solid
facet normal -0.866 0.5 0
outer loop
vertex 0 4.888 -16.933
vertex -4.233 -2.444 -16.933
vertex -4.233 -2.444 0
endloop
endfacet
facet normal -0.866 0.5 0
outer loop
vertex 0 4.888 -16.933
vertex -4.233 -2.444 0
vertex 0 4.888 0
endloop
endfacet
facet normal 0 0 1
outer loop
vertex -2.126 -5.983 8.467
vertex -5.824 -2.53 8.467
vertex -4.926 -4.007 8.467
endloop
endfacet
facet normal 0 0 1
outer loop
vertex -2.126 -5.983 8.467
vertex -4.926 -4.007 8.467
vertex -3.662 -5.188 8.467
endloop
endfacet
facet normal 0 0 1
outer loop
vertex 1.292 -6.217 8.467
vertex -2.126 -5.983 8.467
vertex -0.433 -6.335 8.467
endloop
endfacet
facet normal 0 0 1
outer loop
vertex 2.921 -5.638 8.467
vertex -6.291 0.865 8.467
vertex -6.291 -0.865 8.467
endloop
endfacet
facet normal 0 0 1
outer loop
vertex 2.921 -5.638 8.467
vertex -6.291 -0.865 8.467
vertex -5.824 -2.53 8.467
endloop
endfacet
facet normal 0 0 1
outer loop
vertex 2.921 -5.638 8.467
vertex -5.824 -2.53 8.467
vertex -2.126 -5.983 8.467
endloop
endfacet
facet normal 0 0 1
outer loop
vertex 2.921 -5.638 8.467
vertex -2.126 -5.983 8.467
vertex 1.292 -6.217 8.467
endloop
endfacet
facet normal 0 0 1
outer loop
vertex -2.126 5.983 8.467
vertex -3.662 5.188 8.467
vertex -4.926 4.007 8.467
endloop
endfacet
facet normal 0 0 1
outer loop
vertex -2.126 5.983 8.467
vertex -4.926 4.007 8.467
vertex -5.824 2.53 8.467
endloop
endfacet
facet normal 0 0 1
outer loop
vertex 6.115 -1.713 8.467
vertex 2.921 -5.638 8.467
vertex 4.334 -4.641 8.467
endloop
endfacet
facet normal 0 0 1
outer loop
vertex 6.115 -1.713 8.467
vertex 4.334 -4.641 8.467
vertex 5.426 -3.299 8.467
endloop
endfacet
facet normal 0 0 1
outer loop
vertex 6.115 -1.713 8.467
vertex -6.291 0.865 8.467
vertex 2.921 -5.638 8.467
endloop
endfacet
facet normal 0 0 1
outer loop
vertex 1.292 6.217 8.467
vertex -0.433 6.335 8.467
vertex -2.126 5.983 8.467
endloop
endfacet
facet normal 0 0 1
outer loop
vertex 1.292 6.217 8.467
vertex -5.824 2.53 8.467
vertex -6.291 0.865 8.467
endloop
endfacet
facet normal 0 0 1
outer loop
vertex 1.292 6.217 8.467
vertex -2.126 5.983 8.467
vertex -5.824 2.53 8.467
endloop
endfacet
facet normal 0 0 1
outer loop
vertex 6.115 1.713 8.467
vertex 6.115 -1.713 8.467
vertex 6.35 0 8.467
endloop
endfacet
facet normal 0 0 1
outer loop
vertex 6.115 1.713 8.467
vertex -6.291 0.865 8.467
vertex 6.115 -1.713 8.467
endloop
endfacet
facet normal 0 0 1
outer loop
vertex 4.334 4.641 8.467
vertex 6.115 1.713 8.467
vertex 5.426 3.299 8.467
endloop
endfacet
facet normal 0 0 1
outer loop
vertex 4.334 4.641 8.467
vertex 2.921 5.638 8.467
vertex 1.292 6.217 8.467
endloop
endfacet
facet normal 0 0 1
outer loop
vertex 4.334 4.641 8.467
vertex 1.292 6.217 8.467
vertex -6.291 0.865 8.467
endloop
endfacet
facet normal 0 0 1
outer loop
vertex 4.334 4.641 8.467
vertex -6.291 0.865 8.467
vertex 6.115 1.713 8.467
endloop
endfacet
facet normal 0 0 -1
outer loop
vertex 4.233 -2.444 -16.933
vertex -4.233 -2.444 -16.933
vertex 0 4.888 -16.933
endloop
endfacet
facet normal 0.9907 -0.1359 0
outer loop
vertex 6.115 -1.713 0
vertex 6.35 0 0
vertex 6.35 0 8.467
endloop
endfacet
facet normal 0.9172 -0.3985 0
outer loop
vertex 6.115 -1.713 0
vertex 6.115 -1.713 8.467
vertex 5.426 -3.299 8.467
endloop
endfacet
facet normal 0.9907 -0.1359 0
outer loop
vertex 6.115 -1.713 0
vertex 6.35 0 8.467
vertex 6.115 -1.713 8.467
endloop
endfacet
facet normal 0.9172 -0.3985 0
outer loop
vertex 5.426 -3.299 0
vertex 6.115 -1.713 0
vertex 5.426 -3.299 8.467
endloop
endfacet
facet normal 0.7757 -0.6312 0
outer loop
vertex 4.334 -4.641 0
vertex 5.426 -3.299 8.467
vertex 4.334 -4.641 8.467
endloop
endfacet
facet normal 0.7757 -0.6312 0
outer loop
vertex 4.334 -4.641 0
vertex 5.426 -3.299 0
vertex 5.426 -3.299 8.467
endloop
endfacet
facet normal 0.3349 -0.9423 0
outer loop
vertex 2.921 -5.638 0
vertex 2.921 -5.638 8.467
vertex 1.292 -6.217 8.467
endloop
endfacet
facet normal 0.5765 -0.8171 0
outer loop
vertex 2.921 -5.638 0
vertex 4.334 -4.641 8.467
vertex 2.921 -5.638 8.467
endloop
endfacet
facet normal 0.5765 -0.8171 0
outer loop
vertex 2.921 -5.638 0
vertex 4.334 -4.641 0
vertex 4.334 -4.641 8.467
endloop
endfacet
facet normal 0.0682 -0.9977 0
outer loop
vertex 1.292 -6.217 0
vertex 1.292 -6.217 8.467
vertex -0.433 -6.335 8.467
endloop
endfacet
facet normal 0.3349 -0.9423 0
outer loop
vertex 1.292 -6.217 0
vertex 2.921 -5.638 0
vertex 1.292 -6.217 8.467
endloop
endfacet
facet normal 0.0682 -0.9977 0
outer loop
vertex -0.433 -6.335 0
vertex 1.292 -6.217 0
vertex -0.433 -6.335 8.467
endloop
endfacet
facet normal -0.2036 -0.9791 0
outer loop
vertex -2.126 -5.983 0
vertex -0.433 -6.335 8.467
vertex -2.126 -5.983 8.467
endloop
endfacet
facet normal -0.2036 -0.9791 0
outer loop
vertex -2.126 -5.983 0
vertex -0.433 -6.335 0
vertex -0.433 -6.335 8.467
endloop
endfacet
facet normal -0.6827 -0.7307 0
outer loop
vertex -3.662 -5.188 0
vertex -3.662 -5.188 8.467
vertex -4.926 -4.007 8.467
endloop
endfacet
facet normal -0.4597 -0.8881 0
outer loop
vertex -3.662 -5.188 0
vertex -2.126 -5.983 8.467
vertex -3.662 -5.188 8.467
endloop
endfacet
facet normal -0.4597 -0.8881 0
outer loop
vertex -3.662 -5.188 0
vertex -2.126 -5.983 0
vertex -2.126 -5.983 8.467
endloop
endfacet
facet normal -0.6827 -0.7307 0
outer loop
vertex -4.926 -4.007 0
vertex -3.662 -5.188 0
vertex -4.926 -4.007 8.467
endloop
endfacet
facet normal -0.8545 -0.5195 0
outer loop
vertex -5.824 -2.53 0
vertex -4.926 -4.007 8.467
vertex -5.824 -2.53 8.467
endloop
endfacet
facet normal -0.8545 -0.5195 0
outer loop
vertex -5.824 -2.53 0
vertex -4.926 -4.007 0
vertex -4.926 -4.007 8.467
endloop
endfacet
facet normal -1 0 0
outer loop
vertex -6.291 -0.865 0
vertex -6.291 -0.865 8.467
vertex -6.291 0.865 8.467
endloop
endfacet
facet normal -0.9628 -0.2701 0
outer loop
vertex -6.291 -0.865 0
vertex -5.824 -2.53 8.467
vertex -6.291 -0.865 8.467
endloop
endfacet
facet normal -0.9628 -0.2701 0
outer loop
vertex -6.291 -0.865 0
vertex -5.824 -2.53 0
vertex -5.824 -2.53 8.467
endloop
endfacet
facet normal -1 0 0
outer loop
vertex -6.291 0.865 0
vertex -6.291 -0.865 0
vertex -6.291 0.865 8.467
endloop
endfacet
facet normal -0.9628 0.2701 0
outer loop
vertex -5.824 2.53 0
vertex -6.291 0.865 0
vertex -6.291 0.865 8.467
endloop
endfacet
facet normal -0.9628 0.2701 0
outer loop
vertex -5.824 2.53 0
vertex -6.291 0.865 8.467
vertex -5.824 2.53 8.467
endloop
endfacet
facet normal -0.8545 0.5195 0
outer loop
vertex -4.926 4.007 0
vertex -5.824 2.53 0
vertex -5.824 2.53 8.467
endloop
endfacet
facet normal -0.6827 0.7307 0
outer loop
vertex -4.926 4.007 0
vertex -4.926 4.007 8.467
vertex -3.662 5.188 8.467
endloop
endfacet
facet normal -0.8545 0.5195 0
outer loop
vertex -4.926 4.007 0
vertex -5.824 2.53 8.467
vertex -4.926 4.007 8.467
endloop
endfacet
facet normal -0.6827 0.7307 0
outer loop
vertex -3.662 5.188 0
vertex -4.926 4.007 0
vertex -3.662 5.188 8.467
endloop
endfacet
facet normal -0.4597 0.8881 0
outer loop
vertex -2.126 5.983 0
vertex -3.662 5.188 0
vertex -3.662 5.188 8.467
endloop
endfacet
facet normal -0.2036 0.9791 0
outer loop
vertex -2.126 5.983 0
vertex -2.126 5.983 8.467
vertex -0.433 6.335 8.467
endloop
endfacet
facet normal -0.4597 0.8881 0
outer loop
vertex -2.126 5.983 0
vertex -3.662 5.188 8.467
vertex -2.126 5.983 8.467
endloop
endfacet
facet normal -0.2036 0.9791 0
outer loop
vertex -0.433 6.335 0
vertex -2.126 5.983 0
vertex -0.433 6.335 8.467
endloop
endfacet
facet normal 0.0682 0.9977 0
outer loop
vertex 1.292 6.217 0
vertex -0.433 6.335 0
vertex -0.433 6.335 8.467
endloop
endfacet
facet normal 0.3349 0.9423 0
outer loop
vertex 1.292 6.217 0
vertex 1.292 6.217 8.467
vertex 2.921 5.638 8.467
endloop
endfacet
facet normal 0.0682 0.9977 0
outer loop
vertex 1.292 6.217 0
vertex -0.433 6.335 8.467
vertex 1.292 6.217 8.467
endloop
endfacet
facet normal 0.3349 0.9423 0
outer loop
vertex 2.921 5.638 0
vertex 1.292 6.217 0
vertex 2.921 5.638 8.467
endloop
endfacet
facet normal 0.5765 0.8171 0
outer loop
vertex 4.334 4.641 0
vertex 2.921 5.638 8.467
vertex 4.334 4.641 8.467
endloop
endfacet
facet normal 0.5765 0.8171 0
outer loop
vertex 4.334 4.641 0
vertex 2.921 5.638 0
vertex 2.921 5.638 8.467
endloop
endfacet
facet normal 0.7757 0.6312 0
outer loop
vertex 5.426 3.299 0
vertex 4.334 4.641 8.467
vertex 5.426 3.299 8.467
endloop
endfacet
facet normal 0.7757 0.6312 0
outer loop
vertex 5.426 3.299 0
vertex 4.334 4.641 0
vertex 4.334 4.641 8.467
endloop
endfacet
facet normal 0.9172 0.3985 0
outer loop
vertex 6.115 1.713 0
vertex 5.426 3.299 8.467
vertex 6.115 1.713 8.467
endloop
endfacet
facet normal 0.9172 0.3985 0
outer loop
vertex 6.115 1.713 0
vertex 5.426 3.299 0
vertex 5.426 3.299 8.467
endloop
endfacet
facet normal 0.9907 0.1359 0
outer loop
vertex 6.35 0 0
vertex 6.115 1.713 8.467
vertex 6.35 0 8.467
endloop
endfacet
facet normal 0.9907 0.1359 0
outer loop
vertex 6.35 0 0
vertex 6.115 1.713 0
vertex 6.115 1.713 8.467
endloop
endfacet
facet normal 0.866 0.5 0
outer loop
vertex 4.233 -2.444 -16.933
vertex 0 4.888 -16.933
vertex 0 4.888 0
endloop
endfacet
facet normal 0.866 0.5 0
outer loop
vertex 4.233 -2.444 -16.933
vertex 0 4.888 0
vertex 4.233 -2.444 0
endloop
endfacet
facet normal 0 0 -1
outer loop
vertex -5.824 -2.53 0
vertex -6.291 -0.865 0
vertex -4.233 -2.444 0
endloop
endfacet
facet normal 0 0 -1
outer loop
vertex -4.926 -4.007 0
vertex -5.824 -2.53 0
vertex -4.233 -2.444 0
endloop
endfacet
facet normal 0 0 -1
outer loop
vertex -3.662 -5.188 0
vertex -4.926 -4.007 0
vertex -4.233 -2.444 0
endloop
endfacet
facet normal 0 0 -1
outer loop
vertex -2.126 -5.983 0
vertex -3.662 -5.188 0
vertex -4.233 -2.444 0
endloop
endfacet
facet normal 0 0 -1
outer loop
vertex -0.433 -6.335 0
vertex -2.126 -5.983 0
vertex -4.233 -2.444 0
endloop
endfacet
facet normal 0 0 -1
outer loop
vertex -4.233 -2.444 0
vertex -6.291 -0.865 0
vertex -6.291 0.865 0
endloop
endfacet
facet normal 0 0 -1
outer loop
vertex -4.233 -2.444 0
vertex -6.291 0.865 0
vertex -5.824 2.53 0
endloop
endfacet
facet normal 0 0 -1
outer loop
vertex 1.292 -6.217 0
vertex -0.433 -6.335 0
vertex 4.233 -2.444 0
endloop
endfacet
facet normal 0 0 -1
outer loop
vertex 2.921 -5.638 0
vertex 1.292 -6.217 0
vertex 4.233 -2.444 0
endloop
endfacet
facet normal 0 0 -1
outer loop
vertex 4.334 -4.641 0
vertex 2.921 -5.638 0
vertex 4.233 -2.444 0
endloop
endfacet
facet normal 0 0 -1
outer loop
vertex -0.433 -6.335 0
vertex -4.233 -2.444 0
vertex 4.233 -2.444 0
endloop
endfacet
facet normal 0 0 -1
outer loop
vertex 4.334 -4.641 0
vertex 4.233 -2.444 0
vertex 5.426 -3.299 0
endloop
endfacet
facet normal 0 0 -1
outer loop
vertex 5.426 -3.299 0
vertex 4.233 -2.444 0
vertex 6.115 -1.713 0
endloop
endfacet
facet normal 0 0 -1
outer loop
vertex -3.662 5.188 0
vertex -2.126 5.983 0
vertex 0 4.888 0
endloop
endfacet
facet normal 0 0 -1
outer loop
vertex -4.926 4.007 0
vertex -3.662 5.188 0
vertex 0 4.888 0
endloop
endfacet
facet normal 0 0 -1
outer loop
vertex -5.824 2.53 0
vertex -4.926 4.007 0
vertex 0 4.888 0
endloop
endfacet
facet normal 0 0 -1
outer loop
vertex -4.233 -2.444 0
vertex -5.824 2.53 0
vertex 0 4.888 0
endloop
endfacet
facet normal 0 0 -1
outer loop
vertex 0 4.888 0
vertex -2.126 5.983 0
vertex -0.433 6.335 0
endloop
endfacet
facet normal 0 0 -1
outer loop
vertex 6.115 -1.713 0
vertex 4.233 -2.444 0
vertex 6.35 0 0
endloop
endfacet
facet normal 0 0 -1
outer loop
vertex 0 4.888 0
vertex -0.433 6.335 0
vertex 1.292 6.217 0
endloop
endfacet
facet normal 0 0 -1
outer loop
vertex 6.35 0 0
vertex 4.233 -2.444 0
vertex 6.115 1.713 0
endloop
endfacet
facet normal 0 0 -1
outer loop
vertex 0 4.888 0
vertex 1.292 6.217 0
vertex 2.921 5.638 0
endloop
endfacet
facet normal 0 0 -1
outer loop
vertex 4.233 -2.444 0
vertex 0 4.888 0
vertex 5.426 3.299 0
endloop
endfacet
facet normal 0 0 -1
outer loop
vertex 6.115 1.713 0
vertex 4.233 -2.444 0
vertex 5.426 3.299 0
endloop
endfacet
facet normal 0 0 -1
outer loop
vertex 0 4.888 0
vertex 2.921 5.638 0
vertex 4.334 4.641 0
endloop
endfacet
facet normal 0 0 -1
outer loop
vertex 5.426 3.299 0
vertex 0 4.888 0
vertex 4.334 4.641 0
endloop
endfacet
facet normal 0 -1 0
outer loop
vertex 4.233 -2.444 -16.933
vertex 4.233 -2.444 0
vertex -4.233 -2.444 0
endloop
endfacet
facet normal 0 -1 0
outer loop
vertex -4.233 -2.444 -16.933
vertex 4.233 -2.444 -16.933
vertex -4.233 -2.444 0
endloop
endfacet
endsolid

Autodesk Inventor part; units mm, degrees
ref_plane "YZ Plane" through (0, 0, 0) normal (1, 0, 0) x (0, 1, 0)
ref_plane "XZ Plane" through (0, 0, 0) normal (0, 1, 0) x (-1, 0, 0)
ref_plane "XY Plane" through (0, 0, 0) normal (0, 0, 1) x (1, 0, 0)
sketch "Sketch1" plane through (0, 0, 0) normal (0, 0, 1) x (1, 0, 0)
  line L0 (0, 10.9985) -> (9.525, -5.4993)
  line L1 (9.525, -5.4993) -> (-9.525, -5.4993)
  line L2 (-9.525, -5.4993) -> (0, 10.9985)
  line L3 (-4.2333, -2.4441) -> (0, 4.8882)
  line L4 (0, 4.8882) -> (4.2333, -2.4441)
  line L5 (4.2333, -2.4441) -> (-4.2333, -2.4441)
  point P0 (0, 0)
  point P1 (0, 0)
  point P2 (0, 0)
  dimension "d0" = 19.05
  dimension "d1" = 8.4667
extrude "Extrusion1" add sketch "Sketch1" against normal blind 16.9333 contours L3 L4 L5
sketch "Sketch2" plane through (0, 0, 0) normal (0, 0, 1) x (1, 0, 0)
  circle A0 centre (0, 0) radius 6.35
  dimension "d4" = 12.7
extrude "Extrusion2" add sketch "Sketch2" along normal blind 8.4667
properties part number "Driver Shaft" material "ABS Plastic"
